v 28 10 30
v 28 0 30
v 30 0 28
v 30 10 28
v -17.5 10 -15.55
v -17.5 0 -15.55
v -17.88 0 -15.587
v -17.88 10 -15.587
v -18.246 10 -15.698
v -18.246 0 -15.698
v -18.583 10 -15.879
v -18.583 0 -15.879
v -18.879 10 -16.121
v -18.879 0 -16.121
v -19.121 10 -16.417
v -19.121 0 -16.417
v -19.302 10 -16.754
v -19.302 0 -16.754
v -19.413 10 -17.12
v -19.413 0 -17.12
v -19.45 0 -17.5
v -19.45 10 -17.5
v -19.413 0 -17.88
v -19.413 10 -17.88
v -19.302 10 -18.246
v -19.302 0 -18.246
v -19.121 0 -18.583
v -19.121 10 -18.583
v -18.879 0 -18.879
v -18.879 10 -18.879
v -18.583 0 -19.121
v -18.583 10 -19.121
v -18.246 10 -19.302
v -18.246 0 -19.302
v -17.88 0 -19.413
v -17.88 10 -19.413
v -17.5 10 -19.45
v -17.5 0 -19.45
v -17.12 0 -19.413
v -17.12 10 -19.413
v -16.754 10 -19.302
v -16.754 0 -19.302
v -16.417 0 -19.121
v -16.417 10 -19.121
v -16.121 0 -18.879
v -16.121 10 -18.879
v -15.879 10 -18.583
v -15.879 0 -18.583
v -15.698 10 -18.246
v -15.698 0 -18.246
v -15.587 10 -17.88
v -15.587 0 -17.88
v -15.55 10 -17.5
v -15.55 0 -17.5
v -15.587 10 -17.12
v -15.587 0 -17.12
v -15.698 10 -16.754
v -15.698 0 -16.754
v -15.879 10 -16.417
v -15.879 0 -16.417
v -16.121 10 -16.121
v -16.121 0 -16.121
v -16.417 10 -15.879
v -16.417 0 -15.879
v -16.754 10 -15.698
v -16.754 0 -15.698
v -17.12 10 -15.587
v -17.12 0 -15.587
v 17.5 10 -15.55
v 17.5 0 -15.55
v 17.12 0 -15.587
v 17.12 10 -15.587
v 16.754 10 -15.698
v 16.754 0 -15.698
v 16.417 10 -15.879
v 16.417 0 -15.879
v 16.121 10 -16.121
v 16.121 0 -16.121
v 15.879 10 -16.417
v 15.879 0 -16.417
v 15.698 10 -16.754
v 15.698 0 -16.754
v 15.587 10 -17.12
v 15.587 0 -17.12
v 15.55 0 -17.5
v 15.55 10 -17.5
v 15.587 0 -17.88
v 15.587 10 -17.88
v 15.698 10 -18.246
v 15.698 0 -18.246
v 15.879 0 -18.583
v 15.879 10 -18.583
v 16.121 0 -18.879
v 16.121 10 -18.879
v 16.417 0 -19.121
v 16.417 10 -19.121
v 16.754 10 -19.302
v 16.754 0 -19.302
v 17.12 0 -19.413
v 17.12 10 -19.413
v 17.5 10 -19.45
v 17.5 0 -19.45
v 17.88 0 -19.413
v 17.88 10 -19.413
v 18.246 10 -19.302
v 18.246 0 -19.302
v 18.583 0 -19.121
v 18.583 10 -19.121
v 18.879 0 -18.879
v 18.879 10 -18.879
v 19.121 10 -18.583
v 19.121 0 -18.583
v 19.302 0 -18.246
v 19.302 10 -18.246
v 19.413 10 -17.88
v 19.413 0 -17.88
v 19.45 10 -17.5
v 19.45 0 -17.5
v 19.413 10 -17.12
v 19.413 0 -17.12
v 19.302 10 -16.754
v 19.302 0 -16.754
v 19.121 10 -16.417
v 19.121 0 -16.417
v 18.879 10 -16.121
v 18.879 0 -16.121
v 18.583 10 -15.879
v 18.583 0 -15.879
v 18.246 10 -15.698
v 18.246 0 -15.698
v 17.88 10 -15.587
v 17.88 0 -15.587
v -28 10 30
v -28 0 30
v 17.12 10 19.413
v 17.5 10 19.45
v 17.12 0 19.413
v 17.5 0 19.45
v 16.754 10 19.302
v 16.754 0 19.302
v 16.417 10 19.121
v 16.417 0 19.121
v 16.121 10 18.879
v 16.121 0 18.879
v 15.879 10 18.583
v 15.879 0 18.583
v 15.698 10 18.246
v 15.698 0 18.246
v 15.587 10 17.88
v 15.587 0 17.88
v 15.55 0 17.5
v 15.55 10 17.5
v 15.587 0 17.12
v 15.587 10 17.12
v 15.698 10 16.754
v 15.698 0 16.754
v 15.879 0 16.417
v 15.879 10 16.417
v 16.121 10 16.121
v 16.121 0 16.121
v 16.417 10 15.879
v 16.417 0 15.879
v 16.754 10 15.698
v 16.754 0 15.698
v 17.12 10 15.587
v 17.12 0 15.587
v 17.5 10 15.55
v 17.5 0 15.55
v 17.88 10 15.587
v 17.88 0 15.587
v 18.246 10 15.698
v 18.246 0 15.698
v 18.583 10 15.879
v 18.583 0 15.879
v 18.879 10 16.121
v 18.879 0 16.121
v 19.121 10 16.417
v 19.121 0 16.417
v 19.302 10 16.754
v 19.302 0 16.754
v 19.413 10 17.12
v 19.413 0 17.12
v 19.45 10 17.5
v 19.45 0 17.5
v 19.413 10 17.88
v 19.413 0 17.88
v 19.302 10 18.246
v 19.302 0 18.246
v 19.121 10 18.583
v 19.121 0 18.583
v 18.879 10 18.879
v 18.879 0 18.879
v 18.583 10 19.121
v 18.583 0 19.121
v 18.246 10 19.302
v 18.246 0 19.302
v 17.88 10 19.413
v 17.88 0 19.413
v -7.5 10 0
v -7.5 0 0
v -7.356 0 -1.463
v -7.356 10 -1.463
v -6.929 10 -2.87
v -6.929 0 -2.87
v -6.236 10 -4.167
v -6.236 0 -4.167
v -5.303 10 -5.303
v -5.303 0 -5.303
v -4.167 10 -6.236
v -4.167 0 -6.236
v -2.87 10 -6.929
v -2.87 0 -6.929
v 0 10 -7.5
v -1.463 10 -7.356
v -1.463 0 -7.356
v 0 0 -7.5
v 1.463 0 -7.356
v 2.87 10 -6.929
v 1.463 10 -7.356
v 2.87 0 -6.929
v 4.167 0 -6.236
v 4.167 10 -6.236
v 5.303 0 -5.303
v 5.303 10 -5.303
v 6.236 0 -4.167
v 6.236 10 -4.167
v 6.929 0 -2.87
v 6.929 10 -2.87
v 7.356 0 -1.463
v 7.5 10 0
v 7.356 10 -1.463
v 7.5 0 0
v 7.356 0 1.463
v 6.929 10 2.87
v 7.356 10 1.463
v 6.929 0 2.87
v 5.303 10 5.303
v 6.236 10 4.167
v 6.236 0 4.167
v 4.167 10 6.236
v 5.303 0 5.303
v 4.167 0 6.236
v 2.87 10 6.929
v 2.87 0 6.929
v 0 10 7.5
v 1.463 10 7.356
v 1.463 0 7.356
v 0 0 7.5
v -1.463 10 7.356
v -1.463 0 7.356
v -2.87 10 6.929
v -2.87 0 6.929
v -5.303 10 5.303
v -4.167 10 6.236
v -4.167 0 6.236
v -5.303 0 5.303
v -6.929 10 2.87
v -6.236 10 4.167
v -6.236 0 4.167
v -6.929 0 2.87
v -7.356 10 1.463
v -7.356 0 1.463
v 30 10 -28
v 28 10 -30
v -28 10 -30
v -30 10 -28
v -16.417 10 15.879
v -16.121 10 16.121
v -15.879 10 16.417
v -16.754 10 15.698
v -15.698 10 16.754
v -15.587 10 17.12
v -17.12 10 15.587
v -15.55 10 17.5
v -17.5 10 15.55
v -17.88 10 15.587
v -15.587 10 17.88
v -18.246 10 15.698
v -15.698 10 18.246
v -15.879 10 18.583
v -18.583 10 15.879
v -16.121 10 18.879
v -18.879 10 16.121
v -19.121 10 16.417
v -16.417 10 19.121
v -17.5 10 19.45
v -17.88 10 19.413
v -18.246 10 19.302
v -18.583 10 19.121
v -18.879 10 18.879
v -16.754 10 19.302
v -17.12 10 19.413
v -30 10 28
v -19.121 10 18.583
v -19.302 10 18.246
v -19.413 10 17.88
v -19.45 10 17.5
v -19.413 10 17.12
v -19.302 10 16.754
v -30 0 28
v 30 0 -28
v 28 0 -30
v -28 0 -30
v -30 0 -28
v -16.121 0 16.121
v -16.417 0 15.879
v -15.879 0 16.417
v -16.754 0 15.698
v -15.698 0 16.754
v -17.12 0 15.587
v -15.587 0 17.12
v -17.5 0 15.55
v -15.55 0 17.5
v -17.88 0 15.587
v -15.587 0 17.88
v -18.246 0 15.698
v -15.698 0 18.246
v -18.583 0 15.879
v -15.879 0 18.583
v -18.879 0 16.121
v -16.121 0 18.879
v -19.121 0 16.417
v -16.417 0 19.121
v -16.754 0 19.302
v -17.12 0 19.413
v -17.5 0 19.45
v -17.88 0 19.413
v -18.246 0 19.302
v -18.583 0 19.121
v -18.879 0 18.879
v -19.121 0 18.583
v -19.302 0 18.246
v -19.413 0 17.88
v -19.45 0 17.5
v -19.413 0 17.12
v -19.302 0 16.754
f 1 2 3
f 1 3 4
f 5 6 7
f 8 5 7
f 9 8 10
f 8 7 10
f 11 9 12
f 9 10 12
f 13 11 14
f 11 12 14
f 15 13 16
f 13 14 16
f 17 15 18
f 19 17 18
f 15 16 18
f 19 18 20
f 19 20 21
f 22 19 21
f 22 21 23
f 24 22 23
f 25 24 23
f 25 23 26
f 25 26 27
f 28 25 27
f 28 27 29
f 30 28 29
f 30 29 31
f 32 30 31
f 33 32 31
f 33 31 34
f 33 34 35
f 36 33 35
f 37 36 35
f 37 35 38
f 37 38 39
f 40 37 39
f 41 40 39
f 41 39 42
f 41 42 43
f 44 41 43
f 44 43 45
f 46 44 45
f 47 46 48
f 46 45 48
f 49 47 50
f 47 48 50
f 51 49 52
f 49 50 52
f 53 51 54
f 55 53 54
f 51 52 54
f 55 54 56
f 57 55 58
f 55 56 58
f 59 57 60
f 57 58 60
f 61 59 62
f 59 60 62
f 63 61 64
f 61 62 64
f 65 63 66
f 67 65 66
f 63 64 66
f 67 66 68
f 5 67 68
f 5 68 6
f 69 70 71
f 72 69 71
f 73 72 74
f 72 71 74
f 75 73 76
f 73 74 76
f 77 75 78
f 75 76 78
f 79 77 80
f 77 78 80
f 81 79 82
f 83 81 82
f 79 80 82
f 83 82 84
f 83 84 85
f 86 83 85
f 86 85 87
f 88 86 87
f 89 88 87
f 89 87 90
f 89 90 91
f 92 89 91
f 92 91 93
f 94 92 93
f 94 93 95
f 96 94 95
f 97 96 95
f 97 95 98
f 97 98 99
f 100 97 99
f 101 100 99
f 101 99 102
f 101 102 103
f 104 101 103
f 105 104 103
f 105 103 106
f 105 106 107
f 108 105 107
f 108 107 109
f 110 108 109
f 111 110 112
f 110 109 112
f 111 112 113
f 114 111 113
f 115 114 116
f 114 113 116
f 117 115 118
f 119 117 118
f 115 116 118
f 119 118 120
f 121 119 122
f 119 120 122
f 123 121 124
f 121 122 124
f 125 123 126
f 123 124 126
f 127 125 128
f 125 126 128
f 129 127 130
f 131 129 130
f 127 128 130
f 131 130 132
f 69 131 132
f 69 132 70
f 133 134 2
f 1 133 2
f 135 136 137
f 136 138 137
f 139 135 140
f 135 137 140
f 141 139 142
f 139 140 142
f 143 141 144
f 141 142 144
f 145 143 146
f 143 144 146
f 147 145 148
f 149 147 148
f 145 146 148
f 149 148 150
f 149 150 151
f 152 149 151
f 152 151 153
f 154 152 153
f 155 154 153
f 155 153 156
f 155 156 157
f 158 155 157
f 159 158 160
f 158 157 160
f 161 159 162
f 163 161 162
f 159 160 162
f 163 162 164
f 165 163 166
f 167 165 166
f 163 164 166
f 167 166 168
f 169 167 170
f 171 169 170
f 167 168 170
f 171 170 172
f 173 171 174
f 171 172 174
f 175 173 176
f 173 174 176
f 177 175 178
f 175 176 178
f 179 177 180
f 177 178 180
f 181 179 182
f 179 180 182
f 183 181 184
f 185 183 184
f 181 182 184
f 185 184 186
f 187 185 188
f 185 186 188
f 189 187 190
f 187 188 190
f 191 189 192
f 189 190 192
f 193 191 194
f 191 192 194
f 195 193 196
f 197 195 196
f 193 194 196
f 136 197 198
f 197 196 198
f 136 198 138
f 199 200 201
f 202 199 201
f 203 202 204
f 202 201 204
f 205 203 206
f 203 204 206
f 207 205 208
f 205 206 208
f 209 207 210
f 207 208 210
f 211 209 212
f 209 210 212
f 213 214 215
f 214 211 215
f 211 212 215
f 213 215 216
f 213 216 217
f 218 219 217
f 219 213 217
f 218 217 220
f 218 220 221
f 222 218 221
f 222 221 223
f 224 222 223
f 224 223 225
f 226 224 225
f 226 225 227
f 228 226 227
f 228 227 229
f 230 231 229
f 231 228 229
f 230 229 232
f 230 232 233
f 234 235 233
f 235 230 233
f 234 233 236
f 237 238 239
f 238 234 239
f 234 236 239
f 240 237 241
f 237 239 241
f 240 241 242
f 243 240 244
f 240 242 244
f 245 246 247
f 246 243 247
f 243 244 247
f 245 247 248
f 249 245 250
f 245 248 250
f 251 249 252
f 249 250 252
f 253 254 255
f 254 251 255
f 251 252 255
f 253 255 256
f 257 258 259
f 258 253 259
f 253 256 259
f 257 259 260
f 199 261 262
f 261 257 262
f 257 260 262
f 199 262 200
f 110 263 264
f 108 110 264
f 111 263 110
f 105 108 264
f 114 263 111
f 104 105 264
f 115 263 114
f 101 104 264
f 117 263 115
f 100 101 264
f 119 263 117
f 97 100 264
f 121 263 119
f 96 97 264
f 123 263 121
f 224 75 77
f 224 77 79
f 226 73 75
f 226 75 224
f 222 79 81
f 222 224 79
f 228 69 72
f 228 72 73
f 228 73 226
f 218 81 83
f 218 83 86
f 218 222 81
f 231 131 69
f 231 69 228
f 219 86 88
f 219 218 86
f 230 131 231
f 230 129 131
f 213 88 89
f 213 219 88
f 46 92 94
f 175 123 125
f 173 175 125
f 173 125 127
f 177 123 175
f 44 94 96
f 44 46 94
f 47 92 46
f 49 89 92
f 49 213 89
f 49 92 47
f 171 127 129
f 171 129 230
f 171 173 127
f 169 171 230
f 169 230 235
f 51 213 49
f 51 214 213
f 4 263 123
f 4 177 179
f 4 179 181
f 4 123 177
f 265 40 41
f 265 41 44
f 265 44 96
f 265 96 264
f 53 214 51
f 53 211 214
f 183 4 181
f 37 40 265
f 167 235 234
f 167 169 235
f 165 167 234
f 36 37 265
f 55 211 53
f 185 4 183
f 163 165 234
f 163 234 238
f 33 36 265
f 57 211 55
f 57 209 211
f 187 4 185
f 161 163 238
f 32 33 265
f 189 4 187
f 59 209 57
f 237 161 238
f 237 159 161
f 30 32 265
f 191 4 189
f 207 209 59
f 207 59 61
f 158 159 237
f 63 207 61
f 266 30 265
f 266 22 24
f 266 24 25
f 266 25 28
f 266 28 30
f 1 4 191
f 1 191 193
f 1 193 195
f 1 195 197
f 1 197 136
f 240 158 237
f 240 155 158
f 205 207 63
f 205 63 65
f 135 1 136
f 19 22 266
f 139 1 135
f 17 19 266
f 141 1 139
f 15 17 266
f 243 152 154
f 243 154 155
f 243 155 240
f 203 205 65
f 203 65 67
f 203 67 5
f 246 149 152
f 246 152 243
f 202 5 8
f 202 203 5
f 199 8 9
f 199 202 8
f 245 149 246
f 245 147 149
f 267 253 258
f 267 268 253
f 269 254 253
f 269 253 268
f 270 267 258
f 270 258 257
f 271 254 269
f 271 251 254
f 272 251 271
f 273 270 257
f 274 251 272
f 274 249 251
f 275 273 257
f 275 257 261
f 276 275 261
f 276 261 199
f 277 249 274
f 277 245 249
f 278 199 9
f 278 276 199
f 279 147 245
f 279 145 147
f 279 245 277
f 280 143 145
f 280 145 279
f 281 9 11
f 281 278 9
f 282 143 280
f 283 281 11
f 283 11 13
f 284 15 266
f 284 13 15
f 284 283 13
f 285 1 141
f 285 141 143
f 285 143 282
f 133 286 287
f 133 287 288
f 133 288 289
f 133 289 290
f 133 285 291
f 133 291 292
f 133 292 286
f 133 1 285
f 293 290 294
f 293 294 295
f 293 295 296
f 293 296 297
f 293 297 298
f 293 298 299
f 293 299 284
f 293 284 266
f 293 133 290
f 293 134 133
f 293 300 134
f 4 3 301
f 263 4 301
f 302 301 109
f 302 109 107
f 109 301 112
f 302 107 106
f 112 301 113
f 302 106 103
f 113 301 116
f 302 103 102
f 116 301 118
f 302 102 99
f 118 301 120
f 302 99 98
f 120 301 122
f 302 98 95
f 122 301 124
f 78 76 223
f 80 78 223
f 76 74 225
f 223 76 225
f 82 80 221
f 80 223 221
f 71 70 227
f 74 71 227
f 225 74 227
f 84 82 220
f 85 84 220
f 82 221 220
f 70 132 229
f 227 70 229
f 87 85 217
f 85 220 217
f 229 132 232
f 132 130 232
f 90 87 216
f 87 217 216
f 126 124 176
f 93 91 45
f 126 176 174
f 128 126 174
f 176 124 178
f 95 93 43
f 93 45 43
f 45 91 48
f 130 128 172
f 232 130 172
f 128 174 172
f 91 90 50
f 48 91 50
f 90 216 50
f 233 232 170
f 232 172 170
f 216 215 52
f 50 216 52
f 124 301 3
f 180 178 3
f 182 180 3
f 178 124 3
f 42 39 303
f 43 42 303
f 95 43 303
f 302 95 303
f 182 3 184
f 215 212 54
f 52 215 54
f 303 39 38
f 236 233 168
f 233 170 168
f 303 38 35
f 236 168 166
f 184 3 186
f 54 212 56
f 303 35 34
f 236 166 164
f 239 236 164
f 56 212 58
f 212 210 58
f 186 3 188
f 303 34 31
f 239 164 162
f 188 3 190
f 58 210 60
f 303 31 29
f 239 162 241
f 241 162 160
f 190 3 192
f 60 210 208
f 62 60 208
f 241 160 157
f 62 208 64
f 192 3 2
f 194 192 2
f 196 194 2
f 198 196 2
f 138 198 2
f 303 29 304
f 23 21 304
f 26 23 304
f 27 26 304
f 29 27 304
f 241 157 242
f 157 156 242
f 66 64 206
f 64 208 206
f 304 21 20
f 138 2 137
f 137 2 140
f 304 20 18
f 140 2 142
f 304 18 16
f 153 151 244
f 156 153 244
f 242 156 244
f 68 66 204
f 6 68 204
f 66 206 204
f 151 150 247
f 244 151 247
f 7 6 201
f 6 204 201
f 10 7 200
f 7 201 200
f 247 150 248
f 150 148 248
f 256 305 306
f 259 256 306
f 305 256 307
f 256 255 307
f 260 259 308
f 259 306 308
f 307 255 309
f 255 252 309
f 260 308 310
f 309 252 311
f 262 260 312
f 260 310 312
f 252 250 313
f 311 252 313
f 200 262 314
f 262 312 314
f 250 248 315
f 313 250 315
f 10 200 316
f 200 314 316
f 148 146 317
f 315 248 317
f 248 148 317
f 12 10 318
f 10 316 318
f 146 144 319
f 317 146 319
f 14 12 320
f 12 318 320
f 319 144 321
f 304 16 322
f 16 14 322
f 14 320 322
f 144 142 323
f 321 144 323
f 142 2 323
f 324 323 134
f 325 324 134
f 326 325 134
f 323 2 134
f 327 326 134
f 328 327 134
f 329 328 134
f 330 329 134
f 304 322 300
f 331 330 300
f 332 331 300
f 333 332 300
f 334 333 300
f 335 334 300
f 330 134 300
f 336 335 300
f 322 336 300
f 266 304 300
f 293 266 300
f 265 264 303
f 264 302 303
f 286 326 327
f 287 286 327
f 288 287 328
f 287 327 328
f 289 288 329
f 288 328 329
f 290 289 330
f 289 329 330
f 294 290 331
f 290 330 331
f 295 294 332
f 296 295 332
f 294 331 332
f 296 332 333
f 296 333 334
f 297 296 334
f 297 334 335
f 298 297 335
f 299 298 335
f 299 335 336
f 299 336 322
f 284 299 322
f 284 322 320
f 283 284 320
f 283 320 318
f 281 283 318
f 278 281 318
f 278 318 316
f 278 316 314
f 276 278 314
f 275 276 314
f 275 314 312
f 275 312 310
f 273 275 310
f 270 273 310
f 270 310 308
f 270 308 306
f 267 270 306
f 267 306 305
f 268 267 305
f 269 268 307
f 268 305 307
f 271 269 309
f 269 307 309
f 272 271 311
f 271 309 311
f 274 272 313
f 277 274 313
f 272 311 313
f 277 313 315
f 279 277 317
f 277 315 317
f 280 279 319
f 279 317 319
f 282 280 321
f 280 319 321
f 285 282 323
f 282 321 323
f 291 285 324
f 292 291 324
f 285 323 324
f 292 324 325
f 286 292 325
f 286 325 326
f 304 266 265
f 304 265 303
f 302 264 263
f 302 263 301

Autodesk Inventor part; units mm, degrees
ref_plane "YZ Plane" through (0, 0, 0) normal (1, 0, 0) x (0, 1, 0)
ref_plane "XZ Plane" through (0, 0, 0) normal (0, 1, 0) x (-1, 0, 0)
ref_plane "XY Plane" through (0, 0, 0) normal (0, 0, 1) x (1, 0, 0)
sketch "Sketch1" plane through (0, 0, 0) normal (0, 1, 0) x (-1, 0, 0)
  line L0 (-30, -30) -> (30, -30)
  line L1 (30, -30) -> (30, 30)
  line L2 (30, 30) -> (-30, 30)
  line L3 (-30, 30) -> (-30, -30)
  line L4 (-30, -30) -> (30, 30) construction
  line L5 (30, -30) -> (-30, 30) construction
  circle A0 centre (0, 0) radius 7.5
  dimension "d0" = 60
  dimension "d1" = 60
  dimension "d13" = 15
extrude "Extrusion1" add sketch "Sketch1" along normal blind 10
sketch "Sketch2" plane through (0, 10, 0) normal (0, 1, 0) x (1, 0, 0)
  line L0 (30, 30) -> (-30, 30) projected
  line L1 (-30, 30) -> (-30, -30) projected
  line L2 (-30, -30) -> (30, -30) projected
  line L3 (30, -30) -> (30, 30) projected
  line L4 (17.5, -17.5) -> (-17.5, -17.5)
  line L5 (-17.5, -17.5) -> (-17.5, 17.5)
  line L6 (-17.5, 17.5) -> (17.5, 17.5)
  line L7 (17.5, 17.5) -> (17.5, -17.5)
  line L8 (17.5, -17.5) -> (-17.5, 17.5) construction
  line L9 (-17.5, -17.5) -> (17.5, 17.5) construction
  line L10 (0, -17.5) -> (0, 17.5)
  line L11 (-17.5, 0) -> (17.5, 0)
  point P0 (0, 0)
  dimension "d4" = 35
  dimension "d5" = 35
hole "Hole1" at (-17.5, 10, 17.5) at (-17.5, 10, -17.5) at (17.5, 10, -17.5) at (17.5, 10, 17.5) direction (0, -1, 0) diameter 3.9 depth 10 tip angle 118
chamfer "Chamfer1" distance 2 angle 45 4 edges at (30, 5, 30) (30, 5, -30) (-30, 5, -30) (-30, 5, 30)
properties part number "00_XY_stage-CHUO_SEIKI_LD-647-R1-Top"
